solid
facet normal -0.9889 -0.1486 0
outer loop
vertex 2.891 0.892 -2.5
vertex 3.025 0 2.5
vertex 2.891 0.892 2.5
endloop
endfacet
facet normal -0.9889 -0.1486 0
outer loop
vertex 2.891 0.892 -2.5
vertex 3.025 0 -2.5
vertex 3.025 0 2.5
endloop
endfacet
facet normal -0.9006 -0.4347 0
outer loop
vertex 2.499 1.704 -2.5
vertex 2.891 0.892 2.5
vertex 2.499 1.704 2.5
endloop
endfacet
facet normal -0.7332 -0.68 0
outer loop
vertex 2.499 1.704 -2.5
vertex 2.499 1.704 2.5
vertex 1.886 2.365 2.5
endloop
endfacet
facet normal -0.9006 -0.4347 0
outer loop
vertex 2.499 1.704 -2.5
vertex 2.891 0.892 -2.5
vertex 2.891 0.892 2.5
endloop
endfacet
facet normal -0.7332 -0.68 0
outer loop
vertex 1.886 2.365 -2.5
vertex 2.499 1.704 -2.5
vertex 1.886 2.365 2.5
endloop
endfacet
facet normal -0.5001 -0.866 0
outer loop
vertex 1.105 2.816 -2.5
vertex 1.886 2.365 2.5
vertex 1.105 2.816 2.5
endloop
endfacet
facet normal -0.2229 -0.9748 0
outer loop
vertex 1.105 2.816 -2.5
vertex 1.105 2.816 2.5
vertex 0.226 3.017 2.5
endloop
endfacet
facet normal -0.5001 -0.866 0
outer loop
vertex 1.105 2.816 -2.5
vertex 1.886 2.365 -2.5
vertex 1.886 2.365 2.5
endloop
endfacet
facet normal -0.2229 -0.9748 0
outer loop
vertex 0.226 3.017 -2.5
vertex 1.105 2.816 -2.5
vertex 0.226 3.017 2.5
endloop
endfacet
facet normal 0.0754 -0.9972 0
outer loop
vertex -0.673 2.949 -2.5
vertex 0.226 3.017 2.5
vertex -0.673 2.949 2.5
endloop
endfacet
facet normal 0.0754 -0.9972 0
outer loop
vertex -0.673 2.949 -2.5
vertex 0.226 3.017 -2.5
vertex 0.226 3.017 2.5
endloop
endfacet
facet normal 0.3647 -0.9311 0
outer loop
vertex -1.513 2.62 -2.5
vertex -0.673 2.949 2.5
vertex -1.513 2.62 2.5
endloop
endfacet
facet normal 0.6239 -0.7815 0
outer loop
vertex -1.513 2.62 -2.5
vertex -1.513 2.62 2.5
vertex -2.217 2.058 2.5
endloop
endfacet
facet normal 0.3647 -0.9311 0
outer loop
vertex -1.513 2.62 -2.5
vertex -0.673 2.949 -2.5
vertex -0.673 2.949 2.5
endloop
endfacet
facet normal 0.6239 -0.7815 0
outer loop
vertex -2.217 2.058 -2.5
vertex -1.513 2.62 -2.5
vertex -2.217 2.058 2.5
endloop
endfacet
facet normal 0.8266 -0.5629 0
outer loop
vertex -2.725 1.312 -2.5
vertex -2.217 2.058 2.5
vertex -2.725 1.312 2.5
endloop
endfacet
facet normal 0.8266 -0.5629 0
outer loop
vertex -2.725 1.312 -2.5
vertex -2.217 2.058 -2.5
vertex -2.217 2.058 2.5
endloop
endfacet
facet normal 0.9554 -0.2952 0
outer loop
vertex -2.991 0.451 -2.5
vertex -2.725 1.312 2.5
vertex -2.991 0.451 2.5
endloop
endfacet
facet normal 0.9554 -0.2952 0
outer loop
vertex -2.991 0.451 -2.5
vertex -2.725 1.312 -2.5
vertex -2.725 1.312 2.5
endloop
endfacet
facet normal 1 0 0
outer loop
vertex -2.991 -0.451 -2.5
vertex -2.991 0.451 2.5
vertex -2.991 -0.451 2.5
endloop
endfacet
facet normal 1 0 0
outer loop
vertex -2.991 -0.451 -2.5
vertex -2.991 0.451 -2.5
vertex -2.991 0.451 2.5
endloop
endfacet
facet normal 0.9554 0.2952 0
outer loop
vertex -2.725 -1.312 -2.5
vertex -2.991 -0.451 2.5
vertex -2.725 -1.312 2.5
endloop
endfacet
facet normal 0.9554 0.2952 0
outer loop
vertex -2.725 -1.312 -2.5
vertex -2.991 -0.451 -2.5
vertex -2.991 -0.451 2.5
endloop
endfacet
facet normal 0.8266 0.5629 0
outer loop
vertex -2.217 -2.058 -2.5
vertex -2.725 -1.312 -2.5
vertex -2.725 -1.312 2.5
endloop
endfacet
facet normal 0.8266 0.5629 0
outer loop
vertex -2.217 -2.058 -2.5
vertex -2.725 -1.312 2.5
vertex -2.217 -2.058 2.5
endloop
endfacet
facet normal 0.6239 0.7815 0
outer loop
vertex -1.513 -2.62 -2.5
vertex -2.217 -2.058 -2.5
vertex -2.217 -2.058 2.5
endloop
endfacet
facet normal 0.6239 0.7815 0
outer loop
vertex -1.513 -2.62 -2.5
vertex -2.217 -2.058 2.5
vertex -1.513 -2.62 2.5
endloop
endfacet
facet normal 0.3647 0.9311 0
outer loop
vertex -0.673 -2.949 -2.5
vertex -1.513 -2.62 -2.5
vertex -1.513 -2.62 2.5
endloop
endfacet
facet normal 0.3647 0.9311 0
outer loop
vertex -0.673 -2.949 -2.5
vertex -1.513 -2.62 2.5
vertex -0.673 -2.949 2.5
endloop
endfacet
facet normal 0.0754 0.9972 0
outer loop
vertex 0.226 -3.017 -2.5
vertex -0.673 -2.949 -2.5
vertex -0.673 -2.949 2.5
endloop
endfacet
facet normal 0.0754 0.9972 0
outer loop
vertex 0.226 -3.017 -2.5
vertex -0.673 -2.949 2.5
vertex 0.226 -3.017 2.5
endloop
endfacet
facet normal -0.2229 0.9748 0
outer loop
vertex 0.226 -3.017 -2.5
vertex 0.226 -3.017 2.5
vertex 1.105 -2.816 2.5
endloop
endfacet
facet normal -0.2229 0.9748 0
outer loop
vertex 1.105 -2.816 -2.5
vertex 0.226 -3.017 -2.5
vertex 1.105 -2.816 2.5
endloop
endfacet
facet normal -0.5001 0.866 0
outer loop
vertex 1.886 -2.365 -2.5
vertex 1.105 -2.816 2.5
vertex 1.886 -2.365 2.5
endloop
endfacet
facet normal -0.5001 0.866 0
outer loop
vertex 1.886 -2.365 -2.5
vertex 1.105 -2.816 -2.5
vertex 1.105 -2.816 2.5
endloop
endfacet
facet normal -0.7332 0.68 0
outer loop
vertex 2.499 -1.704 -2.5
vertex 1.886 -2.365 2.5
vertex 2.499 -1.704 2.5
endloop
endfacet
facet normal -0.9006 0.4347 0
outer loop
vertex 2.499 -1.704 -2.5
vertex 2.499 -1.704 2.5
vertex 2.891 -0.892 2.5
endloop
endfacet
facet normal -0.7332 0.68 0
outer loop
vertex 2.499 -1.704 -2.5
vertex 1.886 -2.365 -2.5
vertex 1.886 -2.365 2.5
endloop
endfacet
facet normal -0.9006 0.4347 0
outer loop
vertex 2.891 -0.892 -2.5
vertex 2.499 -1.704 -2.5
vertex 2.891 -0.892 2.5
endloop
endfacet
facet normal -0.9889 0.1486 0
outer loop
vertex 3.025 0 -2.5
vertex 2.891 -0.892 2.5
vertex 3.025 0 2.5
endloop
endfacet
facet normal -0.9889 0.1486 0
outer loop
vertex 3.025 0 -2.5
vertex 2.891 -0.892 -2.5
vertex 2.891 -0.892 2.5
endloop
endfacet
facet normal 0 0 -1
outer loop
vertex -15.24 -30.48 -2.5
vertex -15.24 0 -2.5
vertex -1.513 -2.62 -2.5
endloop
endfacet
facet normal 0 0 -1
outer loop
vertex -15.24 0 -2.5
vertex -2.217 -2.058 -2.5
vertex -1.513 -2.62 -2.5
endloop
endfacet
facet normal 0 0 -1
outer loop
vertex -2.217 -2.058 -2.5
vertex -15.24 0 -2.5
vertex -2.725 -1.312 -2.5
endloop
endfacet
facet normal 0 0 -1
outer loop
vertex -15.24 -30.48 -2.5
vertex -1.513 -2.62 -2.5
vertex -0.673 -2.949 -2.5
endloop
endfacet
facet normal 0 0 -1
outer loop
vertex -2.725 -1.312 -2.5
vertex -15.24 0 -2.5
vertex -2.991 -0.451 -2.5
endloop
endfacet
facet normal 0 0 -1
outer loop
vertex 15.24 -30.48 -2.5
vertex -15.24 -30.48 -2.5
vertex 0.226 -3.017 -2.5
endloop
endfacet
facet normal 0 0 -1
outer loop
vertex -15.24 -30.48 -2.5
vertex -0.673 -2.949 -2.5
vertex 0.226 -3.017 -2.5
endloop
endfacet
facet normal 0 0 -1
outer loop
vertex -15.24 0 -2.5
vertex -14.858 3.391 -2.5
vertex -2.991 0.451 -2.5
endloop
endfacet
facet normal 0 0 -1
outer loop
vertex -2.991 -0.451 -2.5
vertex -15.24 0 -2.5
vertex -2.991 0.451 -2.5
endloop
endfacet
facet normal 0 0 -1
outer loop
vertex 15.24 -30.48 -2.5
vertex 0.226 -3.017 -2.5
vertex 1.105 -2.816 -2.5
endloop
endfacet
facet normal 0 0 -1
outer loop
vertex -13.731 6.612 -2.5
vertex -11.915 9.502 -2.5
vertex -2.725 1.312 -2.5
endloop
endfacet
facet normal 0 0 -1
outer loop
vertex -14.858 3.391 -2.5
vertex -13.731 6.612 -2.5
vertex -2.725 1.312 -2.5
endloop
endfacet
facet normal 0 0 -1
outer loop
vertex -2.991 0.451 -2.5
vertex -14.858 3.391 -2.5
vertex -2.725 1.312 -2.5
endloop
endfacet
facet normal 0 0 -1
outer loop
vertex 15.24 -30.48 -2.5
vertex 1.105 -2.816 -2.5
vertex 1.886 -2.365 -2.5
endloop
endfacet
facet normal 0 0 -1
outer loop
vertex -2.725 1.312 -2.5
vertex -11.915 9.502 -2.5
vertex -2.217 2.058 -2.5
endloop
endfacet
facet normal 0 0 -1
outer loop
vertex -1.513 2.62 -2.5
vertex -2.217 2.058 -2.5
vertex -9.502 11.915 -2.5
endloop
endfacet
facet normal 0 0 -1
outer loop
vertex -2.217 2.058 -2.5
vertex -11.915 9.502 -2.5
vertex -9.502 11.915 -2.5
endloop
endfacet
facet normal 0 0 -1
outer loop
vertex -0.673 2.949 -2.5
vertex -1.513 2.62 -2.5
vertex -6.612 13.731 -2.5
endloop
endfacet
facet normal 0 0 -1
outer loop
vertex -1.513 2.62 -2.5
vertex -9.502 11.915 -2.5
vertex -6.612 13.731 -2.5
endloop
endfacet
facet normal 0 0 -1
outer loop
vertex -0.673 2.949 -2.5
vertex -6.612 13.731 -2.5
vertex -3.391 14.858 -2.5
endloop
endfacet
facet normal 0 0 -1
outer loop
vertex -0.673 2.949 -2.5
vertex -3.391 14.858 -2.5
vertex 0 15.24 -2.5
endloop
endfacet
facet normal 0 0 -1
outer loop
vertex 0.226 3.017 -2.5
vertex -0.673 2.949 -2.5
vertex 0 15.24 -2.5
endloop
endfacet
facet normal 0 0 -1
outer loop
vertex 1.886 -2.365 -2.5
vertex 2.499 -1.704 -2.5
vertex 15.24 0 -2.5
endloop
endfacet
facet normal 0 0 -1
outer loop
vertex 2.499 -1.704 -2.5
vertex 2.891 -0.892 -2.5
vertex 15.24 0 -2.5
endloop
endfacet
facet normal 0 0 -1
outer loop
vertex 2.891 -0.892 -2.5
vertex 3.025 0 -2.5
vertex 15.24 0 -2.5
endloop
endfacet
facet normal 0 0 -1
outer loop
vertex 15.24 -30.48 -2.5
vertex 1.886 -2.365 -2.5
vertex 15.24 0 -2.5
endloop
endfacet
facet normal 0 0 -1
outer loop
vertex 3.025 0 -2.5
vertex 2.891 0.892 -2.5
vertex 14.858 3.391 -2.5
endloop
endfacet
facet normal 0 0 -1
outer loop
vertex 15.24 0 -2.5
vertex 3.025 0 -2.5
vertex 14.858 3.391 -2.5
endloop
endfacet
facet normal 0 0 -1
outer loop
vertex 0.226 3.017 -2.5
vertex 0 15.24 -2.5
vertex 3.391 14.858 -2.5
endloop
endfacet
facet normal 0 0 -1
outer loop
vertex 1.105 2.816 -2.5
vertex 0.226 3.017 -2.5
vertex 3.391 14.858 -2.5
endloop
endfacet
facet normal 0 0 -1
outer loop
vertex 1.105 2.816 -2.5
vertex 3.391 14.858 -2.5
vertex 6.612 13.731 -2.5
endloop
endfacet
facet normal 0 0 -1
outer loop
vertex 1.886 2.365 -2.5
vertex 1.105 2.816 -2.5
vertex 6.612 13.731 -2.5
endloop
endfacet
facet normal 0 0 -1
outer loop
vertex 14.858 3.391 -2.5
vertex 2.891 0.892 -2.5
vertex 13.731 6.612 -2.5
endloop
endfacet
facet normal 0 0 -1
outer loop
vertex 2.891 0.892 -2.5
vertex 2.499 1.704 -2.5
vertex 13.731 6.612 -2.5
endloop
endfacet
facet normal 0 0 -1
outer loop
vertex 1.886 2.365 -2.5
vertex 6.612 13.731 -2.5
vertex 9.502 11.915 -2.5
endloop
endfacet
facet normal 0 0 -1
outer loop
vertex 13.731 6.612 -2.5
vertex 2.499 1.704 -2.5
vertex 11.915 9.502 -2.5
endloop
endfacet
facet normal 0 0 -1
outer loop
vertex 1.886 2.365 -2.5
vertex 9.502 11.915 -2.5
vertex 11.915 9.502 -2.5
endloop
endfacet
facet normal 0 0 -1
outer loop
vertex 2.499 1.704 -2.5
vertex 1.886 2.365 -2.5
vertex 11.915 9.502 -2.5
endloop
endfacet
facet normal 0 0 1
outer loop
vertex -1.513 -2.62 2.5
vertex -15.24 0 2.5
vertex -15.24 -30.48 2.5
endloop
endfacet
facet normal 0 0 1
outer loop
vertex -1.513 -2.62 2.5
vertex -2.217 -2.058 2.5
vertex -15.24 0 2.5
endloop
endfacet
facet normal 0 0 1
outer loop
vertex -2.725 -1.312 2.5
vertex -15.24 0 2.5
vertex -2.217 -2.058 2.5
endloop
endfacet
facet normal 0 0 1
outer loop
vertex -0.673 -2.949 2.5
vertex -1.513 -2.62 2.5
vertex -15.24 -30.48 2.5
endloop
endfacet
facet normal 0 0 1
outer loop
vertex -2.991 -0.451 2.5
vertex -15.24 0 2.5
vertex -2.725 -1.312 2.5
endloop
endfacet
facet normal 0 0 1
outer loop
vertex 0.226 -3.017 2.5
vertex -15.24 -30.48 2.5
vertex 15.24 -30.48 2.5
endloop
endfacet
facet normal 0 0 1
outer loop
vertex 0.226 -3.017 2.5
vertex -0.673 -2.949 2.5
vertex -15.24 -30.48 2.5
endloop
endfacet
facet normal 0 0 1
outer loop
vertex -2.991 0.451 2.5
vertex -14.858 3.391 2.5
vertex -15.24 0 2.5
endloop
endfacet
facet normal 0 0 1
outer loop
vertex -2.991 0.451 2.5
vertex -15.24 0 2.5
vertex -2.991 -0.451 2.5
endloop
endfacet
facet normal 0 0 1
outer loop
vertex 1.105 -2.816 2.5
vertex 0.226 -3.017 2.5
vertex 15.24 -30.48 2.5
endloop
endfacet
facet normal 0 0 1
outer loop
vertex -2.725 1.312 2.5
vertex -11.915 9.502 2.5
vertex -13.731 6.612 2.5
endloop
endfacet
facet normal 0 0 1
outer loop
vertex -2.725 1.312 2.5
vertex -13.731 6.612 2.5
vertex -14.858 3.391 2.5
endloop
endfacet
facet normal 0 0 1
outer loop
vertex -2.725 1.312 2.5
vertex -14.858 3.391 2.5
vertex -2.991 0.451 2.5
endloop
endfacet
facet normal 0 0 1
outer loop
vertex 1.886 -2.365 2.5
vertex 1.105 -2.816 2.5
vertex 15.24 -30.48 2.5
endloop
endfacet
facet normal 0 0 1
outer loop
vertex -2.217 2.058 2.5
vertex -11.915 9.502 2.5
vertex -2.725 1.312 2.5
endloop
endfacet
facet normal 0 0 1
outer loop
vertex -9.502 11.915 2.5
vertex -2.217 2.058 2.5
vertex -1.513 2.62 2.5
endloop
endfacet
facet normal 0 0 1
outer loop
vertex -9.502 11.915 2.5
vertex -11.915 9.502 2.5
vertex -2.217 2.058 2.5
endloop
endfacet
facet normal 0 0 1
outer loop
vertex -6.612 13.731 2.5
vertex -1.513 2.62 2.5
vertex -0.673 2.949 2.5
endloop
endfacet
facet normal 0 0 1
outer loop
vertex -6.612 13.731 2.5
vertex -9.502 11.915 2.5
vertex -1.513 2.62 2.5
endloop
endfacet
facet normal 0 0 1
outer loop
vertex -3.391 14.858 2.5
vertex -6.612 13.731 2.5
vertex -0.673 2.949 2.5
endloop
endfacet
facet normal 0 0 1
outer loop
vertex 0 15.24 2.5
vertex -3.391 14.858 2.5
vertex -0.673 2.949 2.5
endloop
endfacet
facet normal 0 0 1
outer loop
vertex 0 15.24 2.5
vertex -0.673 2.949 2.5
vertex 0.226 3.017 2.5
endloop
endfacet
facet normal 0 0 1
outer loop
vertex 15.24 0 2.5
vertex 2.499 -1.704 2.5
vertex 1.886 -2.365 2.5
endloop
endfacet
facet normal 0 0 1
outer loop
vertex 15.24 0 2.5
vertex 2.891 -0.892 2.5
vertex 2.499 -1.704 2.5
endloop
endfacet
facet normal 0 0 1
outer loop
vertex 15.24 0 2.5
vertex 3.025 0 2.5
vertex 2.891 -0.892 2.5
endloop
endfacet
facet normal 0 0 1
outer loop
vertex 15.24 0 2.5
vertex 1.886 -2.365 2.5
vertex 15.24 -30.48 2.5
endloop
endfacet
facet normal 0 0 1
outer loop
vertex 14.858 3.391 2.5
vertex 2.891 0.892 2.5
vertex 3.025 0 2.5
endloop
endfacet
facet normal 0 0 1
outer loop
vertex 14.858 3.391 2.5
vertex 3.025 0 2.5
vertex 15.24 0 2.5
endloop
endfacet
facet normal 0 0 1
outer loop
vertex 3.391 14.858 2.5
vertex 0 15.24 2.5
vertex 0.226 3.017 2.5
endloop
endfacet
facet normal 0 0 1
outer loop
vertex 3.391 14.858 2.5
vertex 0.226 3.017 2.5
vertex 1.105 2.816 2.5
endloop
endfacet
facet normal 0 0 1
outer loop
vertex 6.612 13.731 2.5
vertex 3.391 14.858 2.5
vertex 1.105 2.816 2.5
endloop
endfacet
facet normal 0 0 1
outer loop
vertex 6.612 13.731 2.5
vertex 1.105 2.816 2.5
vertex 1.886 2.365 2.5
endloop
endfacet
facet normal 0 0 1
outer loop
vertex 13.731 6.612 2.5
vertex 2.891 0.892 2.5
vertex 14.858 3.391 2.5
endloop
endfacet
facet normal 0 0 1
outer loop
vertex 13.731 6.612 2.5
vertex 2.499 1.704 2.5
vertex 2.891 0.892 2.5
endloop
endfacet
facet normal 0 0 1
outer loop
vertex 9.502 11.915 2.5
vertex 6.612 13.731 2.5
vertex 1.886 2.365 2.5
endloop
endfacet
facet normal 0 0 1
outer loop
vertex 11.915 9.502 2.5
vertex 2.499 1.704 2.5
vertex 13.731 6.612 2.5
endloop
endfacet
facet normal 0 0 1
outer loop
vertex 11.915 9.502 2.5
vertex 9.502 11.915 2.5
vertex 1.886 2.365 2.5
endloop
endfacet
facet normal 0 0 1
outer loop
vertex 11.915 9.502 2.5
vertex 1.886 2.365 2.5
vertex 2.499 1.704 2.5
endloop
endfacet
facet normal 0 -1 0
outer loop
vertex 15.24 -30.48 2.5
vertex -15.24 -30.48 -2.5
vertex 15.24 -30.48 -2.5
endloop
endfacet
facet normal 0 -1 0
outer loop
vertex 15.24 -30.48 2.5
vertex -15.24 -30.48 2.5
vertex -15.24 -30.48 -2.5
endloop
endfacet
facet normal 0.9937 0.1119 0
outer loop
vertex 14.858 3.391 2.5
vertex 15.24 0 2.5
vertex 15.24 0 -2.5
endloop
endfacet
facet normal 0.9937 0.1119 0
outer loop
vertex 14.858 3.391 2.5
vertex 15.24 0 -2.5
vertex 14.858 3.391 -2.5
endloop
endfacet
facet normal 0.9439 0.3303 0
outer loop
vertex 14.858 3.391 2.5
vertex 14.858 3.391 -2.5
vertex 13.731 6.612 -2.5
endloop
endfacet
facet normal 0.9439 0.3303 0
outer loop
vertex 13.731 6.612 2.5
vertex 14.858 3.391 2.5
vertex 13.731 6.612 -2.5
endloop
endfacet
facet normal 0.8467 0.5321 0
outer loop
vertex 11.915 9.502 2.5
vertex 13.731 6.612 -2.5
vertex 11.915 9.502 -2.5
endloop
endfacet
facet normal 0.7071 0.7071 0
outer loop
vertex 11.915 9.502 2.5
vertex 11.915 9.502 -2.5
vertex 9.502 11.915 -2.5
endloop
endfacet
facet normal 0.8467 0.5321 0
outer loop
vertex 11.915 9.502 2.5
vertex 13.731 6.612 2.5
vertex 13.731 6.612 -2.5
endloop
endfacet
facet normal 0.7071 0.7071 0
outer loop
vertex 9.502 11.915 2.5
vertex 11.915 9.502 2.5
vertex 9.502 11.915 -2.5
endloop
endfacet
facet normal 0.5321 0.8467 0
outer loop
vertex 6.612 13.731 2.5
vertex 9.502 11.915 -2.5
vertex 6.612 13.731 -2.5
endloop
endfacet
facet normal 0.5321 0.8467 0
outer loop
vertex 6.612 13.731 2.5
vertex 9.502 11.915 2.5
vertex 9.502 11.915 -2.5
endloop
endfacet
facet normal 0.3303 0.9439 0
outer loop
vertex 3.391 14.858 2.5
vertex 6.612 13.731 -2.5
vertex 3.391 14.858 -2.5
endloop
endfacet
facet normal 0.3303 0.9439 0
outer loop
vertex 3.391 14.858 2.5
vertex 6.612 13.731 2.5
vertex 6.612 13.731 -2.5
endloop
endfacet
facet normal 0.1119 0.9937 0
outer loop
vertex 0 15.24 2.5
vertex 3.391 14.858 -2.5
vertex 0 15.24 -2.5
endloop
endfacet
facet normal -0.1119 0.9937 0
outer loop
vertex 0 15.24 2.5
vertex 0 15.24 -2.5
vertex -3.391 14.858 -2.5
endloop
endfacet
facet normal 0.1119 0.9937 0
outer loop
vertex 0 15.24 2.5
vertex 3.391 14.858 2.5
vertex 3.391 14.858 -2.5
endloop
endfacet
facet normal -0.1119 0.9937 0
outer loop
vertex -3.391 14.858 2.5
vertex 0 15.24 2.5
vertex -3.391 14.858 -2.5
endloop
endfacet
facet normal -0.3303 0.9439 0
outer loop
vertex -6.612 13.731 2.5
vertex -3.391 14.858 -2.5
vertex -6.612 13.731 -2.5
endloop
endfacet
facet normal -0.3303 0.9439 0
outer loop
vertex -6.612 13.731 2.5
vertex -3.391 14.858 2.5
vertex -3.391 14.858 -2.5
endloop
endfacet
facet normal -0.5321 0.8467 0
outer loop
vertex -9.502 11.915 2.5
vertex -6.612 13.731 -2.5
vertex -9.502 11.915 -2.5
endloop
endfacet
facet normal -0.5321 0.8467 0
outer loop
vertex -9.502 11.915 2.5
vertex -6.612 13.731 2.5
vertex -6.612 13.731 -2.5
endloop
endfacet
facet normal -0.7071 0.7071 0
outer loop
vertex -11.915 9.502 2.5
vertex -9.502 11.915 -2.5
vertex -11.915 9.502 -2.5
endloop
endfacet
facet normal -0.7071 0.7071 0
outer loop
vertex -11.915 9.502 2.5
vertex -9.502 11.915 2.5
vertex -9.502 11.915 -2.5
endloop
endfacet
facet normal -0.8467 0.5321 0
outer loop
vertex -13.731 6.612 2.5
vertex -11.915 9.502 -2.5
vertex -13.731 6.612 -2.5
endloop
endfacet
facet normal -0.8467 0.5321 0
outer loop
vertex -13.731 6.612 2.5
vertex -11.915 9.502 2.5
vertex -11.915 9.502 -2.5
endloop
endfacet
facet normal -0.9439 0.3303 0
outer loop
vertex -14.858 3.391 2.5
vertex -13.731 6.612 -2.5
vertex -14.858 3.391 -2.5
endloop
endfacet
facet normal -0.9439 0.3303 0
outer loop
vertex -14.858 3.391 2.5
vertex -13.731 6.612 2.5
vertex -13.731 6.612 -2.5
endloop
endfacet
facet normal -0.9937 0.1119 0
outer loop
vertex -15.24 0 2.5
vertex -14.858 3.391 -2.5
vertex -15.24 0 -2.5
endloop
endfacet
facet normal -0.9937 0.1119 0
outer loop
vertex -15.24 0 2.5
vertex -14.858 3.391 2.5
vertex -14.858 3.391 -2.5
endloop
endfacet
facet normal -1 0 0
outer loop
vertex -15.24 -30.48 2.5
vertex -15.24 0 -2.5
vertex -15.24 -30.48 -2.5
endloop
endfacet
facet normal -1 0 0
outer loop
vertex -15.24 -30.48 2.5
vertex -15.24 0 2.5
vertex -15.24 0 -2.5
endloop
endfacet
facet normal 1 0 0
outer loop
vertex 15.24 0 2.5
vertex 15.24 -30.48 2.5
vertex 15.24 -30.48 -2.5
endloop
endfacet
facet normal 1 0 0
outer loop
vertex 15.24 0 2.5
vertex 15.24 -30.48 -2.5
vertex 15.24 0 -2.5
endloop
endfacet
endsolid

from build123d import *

# Parameters (mm, degrees)
SKETCH1_R           = 3.025
BOSS_EXTRUDE1_DEPTH = 2.5


with BuildPart() as part:
    # Sketch1 → Boss-Extrude1 (new body, symmetric)
    with BuildSketch(Plane.XY):
        with BuildLine():
            Line((-15.24, -30.48), (15.24, -30.48))
            Line((15.24, -30.48), (15.24, 0))
            ThreePointArc((15.24, 0), (0, 15.24), (-15.24, 0))
            Line((-15.24, 0), (-15.24, -30.48))
        make_face()
        Circle(SKETCH1_R, mode=Mode.SUBTRACT)
    extrude(amount=BOSS_EXTRUDE1_DEPTH, both=True)


solid = part.part
